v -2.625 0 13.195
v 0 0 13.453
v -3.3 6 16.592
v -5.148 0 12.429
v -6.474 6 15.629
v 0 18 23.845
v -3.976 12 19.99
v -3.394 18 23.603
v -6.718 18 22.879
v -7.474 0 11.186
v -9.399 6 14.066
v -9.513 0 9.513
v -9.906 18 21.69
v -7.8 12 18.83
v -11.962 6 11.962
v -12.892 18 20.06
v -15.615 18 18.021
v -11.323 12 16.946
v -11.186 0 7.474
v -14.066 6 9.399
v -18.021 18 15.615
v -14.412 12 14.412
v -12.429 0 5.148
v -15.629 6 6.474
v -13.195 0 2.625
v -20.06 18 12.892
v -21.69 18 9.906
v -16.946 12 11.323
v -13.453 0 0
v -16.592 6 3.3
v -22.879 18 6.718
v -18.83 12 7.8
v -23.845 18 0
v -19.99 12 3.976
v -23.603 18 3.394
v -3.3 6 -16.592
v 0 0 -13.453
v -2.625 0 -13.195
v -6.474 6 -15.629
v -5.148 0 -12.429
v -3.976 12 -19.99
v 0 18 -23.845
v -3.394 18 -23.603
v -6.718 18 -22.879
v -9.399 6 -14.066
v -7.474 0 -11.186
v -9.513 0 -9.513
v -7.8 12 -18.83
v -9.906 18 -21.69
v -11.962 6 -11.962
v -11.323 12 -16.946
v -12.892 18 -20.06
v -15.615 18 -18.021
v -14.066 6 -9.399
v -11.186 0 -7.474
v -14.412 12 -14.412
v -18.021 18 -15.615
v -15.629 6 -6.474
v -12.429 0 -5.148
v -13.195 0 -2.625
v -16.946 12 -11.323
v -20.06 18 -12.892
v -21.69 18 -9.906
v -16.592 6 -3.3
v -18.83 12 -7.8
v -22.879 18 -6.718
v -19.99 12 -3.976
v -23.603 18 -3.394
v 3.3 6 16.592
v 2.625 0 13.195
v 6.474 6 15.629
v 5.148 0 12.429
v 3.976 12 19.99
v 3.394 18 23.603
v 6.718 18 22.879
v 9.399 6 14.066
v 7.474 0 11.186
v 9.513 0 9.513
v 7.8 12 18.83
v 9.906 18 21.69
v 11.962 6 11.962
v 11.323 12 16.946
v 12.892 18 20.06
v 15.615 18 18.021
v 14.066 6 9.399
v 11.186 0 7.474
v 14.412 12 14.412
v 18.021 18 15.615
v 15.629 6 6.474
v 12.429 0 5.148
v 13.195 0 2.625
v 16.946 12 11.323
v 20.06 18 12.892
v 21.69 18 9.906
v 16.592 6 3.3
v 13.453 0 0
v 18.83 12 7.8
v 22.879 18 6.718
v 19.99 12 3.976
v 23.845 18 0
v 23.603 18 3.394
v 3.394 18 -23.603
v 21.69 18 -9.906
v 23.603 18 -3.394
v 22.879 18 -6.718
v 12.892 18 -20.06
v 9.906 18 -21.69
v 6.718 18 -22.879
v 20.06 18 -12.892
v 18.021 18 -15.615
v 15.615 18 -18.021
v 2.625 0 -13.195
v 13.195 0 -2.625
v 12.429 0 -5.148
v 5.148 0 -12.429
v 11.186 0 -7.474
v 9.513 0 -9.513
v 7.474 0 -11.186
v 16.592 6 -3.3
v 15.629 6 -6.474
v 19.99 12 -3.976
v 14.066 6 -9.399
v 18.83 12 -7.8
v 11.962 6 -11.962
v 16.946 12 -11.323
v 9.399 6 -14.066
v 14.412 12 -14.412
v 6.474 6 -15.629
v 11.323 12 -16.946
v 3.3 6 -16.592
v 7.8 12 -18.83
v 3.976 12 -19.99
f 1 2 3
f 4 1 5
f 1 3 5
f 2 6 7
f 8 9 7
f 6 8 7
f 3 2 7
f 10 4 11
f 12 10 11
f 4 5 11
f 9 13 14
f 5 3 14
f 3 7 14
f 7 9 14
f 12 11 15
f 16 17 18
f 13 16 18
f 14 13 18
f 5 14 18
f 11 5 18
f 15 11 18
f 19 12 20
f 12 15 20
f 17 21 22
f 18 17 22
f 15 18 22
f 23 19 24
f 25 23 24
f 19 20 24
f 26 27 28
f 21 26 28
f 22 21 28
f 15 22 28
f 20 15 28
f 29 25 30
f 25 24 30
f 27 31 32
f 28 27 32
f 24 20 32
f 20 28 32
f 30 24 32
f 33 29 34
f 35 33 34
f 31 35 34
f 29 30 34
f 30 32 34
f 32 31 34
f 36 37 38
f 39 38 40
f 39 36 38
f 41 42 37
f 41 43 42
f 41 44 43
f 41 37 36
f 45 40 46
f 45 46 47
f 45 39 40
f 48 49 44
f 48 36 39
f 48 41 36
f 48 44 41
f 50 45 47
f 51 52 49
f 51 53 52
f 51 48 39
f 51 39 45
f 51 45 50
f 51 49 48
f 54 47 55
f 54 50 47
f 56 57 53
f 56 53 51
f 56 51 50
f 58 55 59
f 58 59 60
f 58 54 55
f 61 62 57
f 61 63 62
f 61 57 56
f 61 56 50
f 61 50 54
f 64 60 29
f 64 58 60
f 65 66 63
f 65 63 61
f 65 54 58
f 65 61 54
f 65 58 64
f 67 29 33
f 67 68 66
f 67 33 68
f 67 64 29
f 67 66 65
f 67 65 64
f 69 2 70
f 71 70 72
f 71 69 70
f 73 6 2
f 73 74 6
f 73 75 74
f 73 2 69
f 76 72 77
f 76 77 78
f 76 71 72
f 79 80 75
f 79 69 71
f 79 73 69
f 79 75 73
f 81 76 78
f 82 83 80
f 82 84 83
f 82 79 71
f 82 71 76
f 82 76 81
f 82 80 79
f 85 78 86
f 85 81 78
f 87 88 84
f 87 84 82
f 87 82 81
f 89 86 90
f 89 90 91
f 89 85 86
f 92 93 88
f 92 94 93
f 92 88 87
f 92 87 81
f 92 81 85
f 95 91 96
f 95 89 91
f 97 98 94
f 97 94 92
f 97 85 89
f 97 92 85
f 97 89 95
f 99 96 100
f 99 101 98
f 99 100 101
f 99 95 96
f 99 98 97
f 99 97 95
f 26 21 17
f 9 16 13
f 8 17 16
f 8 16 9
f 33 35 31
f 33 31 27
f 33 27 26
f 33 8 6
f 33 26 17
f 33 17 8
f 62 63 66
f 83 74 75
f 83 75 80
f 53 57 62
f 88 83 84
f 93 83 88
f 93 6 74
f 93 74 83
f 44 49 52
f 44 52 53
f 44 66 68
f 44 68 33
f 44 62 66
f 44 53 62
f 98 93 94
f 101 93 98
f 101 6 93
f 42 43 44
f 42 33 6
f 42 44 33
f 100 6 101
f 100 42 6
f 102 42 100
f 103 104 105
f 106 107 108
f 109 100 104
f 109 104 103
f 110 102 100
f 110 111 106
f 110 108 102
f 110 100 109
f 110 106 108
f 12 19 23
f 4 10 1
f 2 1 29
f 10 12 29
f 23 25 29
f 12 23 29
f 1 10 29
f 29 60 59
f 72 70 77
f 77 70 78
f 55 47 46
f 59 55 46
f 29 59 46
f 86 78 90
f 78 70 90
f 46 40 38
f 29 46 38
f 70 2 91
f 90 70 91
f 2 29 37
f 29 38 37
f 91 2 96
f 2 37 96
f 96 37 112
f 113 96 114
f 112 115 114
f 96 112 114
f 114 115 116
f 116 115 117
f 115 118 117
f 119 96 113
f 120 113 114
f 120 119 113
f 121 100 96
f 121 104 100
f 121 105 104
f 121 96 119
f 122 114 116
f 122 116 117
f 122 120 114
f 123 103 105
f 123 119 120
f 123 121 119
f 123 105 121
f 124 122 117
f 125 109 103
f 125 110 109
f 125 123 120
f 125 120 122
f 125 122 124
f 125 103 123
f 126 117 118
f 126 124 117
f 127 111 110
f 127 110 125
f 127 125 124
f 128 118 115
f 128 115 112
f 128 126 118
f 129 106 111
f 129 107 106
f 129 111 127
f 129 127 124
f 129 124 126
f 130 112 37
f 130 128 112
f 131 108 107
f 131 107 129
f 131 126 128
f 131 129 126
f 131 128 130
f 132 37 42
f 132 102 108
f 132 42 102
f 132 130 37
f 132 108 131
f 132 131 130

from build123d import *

# Parameters (mm, degrees)
SKETCH1_W           = 50
SKETCH1_H           = 50
BOSS_EXTRUDE1_DEPTH = 18
FILLET1_R           = 25
CHAMFER1_SIZE       = 11.547005384
CHAMFER1_SIZE_2     = 20


# Some blends are built 0.0001 mm under size
with BuildPart() as part:
    # Sketch1 → Boss-Extrude1 (new body)
    with BuildSketch(Plane(origin=(0, 0, 0), x_dir=(1, 0, 0), z_dir=(0, 1, 0))):
        Rectangle(SKETCH1_W, SKETCH1_H)
    extrude(amount=BOSS_EXTRUDE1_DEPTH)

    # Fillet1
    fillet1_edges = [part.edges().sort_by_distance(p)[0] for p in [
        (-25, 9, -25),
        (25, 9, -25),
        (25, 9, 25),
        (-25, 9, 25),
    ]]
    fillet(fillet1_edges, radius=FILLET1_R - 0.0001)  # a hair under: the kernel refuses the full size

    # Chamfer1
    # the kernel refuses this chamfer: 20, 11.547005384 mm, written as the material it takes off along each edge
    with BuildSketch(Plane(origin=(0.0001, 0, 0.0001), x_dir=(0, 0, 1), z_dir=(-1, 0, 0))) as chamfer1_piece_1:
        Polygon((24.9999 - CHAMFER1_SIZE, 0), (24.9999, CHAMFER1_SIZE_2), (24.9999, 0), align=None)
    revolve(axis=Axis((0.0001, 0, 0.0001), (0, 1, 0)), revolution_arc=90, mode=Mode.SUBTRACT)
    with BuildSketch(Plane(origin=(0.0001, 0, -0.0001), x_dir=(1, 0, 0), z_dir=(0, 0, 1))) as chamfer1_piece_2:
        Polygon((24.9999 - CHAMFER1_SIZE, 0), (24.9999, CHAMFER1_SIZE_2), (24.9999, 0), align=None)
    revolve(axis=Axis((0.0001, 0, -0.0001), (0, 1, 0)), revolution_arc=90, mode=Mode.SUBTRACT)
    with BuildSketch(Plane(origin=(-0.0001, 0, -0.0001), x_dir=(0, 0, -1), z_dir=(1, 0, 0))) as chamfer1_piece_3:
        Polygon((24.9999 - CHAMFER1_SIZE, 0), (24.9999, CHAMFER1_SIZE_2), (24.9999, 0), align=None)
    revolve(axis=Axis((-0.0001, 0, -0.0001), (0, 1, 0)), revolution_arc=90, mode=Mode.SUBTRACT)
    with BuildSketch(Plane(origin=(-0.0001, 0, 0.0001), x_dir=(0, 0, 1), z_dir=(1, 0, 0))) as chamfer1_piece_4:
        Polygon((24.9999 - CHAMFER1_SIZE, 0), (24.9999, -CHAMFER1_SIZE_2), (24.9999, 0), align=None)
    revolve(axis=Axis((-0.0001, 0, 0.0001), (0, -1, 0)), revolution_arc=90, mode=Mode.SUBTRACT)
    with BuildSketch(Plane(origin=(-0.0001, 0, 25), x_dir=(0, 0.9998132206222079, 0.019326765612700806), z_dir=(1, 0, 0))) as chamfer1_piece_5:
        Polygon((CHAMFER1_SIZE_2 * 0.999813220622, -CHAMFER1_SIZE_2 * 0.0193267656127), (-CHAMFER1_SIZE * 0.0193267656124, -CHAMFER1_SIZE * 0.999813220604), (0, 0), align=None)
    extrude(amount=0.0002, mode=Mode.SUBTRACT)
    with BuildSketch(Plane(origin=(-25, 0, -0.0001), x_dir=(0.9983227437537926, -0.05789386240267081, 0), z_dir=(0, 0, 1)), Plane(origin=(0.0001, 0, -25), x_dir=(0, -0.05789386240267081, 0.9983227437537926), z_dir=(-1, 0, 0)), Plane(origin=(25, 0, 0.0001), x_dir=(-0.9983227437537926, -0.05789386240267081, 0), z_dir=(0, 0, -1))) as chamfer1_piece_6:
        Polygon((CHAMFER1_SIZE * 0.998322743736, CHAMFER1_SIZE * 0.0578938624016), (-CHAMFER1_SIZE_2 * 0.0578938624027, CHAMFER1_SIZE_2 * 0.998322743754), (0, 0), align=None)
    extrude(amount=0.0002, mode=Mode.SUBTRACT)


solid = part.part
